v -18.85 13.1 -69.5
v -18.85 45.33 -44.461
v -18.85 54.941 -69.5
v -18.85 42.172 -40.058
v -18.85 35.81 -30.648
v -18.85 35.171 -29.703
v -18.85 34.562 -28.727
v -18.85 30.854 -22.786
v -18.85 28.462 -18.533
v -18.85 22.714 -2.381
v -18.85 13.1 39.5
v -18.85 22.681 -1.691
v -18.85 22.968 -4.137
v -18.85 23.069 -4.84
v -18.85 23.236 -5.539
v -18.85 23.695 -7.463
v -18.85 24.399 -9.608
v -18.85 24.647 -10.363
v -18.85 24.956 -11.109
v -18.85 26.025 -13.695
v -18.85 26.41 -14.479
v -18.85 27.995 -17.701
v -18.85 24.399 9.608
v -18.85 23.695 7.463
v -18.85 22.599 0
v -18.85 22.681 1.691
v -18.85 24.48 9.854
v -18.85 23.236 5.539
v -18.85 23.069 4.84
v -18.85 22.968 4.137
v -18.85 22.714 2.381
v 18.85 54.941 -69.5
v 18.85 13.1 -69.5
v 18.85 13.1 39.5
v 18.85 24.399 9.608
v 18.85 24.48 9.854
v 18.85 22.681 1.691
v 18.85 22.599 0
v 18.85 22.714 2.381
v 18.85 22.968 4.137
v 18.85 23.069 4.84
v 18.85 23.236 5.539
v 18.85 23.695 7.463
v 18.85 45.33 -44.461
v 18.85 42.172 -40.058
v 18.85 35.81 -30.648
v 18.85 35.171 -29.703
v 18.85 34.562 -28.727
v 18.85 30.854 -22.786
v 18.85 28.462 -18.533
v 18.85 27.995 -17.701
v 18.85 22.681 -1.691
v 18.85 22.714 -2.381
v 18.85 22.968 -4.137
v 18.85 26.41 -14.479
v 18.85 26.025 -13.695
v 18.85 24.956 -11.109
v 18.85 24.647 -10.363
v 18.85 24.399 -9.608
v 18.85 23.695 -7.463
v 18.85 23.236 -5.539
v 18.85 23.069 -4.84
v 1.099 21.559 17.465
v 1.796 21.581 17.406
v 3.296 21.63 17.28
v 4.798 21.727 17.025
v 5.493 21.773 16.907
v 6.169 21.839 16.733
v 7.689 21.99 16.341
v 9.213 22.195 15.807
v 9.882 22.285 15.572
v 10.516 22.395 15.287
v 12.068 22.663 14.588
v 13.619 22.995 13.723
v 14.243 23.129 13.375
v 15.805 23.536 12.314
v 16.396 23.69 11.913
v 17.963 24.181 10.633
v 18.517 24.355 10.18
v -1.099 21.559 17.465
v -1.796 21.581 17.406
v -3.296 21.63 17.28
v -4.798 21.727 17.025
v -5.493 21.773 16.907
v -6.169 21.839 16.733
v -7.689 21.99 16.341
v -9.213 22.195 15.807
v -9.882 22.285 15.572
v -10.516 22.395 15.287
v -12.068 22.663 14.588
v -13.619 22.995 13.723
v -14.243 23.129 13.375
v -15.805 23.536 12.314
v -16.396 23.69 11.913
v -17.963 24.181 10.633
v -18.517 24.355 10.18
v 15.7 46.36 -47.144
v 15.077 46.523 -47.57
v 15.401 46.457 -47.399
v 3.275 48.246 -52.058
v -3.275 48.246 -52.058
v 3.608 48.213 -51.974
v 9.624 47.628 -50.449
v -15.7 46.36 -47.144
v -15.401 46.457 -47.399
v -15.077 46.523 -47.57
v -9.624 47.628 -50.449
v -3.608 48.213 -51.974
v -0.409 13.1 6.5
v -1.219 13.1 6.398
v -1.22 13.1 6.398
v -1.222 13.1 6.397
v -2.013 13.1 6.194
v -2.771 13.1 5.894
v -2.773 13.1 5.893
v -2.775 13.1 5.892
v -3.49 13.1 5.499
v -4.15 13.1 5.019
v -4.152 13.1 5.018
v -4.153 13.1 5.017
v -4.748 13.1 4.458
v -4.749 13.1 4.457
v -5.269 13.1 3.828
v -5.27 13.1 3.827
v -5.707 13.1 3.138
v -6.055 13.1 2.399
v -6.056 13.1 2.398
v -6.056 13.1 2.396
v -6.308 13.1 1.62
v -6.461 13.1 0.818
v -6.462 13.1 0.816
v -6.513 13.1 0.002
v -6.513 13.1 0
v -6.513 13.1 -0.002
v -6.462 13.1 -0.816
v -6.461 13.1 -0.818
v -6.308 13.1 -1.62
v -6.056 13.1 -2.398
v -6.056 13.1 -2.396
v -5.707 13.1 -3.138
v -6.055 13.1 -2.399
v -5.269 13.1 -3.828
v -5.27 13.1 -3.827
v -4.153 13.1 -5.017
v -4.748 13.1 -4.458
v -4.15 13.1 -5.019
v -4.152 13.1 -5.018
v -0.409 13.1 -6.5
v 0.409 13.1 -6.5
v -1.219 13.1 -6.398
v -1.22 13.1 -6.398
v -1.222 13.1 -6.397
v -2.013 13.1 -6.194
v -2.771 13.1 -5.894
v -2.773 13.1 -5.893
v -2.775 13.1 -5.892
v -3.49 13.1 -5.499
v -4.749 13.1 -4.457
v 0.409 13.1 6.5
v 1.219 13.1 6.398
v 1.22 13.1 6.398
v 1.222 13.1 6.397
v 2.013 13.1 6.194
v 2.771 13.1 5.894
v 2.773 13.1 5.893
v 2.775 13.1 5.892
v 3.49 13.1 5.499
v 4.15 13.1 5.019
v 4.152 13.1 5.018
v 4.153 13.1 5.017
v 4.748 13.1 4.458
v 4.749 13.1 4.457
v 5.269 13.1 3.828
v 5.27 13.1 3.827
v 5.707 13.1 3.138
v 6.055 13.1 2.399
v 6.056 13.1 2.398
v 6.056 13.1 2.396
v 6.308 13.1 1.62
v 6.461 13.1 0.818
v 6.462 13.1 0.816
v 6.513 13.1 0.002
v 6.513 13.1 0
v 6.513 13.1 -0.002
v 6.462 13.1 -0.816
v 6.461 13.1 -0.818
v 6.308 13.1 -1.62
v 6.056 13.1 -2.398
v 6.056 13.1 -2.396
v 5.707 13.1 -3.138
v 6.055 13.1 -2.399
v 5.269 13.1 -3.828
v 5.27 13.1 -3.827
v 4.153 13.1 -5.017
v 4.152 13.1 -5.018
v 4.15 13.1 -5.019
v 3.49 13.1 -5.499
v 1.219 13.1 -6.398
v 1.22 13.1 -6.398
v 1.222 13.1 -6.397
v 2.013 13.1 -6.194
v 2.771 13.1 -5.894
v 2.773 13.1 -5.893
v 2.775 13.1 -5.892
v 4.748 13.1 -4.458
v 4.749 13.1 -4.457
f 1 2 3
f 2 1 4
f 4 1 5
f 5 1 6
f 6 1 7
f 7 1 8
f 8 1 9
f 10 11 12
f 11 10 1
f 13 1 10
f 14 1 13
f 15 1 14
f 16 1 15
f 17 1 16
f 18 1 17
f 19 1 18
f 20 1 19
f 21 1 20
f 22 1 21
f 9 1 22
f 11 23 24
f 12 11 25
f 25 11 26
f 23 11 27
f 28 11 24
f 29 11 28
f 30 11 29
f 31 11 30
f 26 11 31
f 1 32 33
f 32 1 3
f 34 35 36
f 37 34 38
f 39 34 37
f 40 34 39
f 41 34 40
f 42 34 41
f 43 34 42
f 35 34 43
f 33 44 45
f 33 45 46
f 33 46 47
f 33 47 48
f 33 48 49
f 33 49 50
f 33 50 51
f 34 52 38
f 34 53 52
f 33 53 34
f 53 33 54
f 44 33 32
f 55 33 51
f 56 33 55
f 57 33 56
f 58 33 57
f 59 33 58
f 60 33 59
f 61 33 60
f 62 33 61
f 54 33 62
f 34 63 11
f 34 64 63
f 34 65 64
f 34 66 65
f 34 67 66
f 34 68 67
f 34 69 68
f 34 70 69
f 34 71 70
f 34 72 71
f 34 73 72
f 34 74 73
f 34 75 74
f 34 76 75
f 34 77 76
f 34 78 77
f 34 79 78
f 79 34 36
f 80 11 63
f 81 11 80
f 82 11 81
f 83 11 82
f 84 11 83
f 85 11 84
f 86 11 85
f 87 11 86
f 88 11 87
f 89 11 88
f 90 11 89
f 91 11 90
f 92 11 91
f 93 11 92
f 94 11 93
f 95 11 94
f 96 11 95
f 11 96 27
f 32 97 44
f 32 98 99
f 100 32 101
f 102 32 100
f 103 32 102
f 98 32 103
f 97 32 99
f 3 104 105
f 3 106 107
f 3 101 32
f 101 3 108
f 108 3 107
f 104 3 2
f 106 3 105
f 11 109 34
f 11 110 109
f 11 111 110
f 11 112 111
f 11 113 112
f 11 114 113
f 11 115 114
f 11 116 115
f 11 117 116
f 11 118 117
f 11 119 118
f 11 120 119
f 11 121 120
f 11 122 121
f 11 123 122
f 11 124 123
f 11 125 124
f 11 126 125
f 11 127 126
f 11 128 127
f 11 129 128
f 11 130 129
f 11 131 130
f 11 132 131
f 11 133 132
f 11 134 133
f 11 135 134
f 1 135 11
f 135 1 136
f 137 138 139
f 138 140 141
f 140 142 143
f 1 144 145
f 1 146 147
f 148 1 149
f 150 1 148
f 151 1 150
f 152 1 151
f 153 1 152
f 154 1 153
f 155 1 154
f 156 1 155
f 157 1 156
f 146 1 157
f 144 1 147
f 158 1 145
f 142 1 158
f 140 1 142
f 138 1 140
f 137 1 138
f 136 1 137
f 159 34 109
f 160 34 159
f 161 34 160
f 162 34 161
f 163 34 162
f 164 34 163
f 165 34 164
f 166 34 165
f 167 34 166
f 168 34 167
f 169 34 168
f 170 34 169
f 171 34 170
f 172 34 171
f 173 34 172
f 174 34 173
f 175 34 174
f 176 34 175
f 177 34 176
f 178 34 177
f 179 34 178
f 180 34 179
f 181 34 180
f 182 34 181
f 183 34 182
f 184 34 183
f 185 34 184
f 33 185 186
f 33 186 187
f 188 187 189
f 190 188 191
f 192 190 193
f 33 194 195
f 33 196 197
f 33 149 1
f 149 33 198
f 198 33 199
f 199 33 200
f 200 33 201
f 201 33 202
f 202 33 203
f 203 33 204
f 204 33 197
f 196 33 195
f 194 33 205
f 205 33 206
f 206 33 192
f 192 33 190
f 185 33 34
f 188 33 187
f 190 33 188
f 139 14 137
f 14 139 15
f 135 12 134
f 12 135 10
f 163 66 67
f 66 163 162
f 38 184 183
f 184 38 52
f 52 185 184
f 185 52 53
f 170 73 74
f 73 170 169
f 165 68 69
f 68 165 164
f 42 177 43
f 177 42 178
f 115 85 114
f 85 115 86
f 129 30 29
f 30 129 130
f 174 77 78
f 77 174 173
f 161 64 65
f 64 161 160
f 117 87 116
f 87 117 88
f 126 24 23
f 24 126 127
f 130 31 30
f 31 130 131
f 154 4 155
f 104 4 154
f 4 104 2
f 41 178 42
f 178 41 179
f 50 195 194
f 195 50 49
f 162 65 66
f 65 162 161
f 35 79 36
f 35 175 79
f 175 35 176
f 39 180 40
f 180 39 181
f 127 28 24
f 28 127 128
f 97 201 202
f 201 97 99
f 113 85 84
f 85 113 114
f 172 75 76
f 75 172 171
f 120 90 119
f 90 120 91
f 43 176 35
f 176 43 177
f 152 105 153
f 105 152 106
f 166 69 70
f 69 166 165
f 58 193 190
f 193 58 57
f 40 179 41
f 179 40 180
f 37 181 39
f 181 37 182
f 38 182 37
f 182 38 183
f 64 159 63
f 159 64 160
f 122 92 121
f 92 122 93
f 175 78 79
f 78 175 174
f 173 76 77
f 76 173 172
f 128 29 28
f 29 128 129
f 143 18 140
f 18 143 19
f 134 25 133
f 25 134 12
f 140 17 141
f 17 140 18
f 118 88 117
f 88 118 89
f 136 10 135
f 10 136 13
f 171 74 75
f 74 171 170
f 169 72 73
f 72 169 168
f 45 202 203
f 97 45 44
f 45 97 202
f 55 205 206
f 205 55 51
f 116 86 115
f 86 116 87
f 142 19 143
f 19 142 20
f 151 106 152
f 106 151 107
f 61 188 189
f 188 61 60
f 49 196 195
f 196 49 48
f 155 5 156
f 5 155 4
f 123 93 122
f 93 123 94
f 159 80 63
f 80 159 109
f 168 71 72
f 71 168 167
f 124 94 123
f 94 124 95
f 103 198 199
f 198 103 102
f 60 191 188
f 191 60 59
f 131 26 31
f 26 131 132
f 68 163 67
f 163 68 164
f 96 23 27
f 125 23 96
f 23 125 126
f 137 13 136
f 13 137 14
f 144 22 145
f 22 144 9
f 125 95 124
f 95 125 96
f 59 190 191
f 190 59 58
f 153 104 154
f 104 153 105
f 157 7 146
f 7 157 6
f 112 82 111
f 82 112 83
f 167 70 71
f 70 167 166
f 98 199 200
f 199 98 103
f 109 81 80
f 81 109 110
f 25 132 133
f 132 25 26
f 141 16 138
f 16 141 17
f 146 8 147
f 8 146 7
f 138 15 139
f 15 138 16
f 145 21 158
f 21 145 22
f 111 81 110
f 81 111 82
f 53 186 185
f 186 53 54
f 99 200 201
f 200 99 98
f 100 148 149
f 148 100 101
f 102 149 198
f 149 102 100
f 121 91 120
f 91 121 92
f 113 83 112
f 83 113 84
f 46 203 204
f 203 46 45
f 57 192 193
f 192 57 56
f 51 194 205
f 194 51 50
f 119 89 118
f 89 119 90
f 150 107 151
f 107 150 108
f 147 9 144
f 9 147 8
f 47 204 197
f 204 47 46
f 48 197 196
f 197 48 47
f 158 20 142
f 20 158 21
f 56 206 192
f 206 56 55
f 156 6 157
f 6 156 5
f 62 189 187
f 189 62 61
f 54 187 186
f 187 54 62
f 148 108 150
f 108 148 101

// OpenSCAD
// Pi Zero Cam Holder
// The "Officiële Raspberry Pi Zero Behuizing"
// - os rounded, so thickness varies 

include <MCAD/boxes.scad>

// box below refers to the housing 
// therefore it is NOT the case we build around it
// box thickness starts at 13 and is raised towards the middle
// rubbers add an additional 1.6mm
// also allow for some spacing (0.4)
rubber_th=1.6;
box_th_bare=14.6;
box_th_incl_rubber=box_th_bare+rubber_th;
box_th=box_th_incl_rubber+0.4;
box_h=79;
box_w=37.7;
box_r=2;

// camera sticks out from the cover approx 4mm
cam_lens_l_normal=3.6; // measured from top of the box cover
cam_lens_l_wide=4.5;   // this one is bigger
cam_lens_l=max(cam_lens_l_normal,cam_lens_l_wide);

// cam hole diameter including spacing
cam_lens_d=8.5; // the box comes with this hole  

// the housing is the metal box holding the lens
cam_hous_w=11.0;
cam_hous_w2=cam_hous_w/2;
cam_hous_th=0.7; // as measured from the top of the box cover

// work with theme material thickness
m=0.4*4; m2=m*2;

$fn=50;

debug=0;
cord=0;
  
//create room for the camera lens to fit inside of the box
lens_rm=4.8; half_rm=lens_rm/2;

module angle(d = 21) {
    e=30;
    o=(box_h+e) * tan(d);
    a=[0,box_h/2];
    b=[0,-box_h/2-e];
    c=[o,-box_h/2-e];
    
    polygon([a,b,c]);
}

//!rotate([-21,0,33])
!difference() {
    translate([-box_w/2,box_th/2+lens_rm,0])
        rotate([90,0,90]) linear_extrude(box_w) angle();
    // normal h=66 graden, wide h=102 graden
    // uitgaande van 33 graden en hoogte 30 +40
    h=60;
    o=h*tan(33);
    translate([0,box_th/2+lens_rm-0.01,0]) 
        rotate([-90,0,0]) 
        cylinder(h=h,r1=6.5,r2=6.5+2*o);
}

module cord_holder() {
    cord_d=3.5;
    translate([
            cord_d/2+max(m,box_r),
            -cord_d/2,
            cord_d/2+m])
    difference() {
        translate([-cord_d/2-m,-cord_d/2-m,-cord_d/2-m])
            union() {
                cube([cord_d+m2, cord_d+m2, cord_d+m2]);
                cube([cord_d+m2, cord_d+m+max(m,box_r), m]);
            }
        rotate([0,90,0]) 
            translate([0,0,-cord_d/2-m-0.01])
            union() {
                cylinder(d=cord_d,h=cord_d+m2+0.02);
                hull() {
                    cylinder(d=cord_d-0.4,h=cord_d+m2+0.02);
                    translate([-3.5,0,0])
                        cylinder(d=cord_d-0.4,h=cord_d+m2+0.02);
                }
            }
    }
}
if (cord) {
  translate([-box_w/2,-box_th/2-m,-box_h/2-m]) cord_holder();
  translate([box_w/2-3.5-box_r-box_r,-box_th/2-m,-box_h/2-m]) cord_holder();
}

module draw_cam_module() {
    union() {
        // lens
        color("black",1.0) cylinder(d=8, h=cam_lens_l);
        translate([-cam_hous_w/2,-cam_hous_w/2])
        color("#c0c0c0",1.0) cube([cam_hous_w,cam_hous_w,cam_hous_th]);
    }
}
module draw_pi_housing() {
    hull() {
        translate([
                -box_w/2,
                -box_th_incl_rubber/2,
                -box_h/2])
            cube([box_w/2,13+rubber_th,box_h]);
        translate([
                -box_w/2,
                -box_th/2,
                -cam_hous_w/2])
            cube([box_w/2,box_th_incl_rubber,cam_hous_w]);
    }
}

if (debug) {
    color("red", 0.5) draw_pi_housing();

    // check to see if camera looks ok
    translate([
            0,
            -box_th/2 +           // from backside
            box_th_incl_rubber,   // on rubbers
            0]) 
        rotate([-90,0,0])
        draw_cam_module();
}

// the basic box
difference() {
    translate([0,half_rm,0])
        roundedBox(
                size=[box_w+m2, box_th+m2+lens_rm, box_h+m2],
                radius=box_r,
                sidesonly=false);
    
    // make it a box instead of a block 
    translate([0,half_rm,0])
        cube(
            [box_w, box_th+lens_rm, box_h],
            center=true);
    
    // remove top of the box
    translate([
            -box_w/2-m,
            -box_th/2-m,
            (box_h+m2)/2-max(box_r,m)-0.01])
        cube([
                box_w+m2+0.1,
                box_th+lens_rm+m2+0.01, 
                max(box_r,m)+0.02]);

    // peek into the box 
    if (debug) {
        translate([-4,-4,0])
            cube(
                [box_w, box_th-4, box_h+m2+0.01],
                center=true);
        translate([box_w/2,+10,0])
            cube(
                [box_w, box_th-4, box_h+m2+0.01],
                center=true);
    }
    
    // help push the camera out of the box (hole in the bottom)
    roundedBox([16,11,box_h+m2+0.01+box_r*2],radius=box_r,sidesonly=false);            
        
    // the camera needs to look outside of the box
    hull() {
        translate([0,box_th/2+lens_rm-0.01,0]) 
            rotate([-90,0,0])
            cylinder(d=cam_lens_d, h=0.01);
        translate([0,box_th/2+lens_rm+m+0.01,0]) 
            rotate([-90,0,0])
            cylinder(d=cam_lens_d+3, h=20.01);
    }
    hull() {
      translate([0,box_th/2,0])
        cube([cam_lens_d,cam_lens_l+0.4,cam_lens_d],center=true);
      translate([0,box_th/2,box_h/2])
        cube([cam_lens_d,cam_lens_l+0.4,cam_lens_d],center=true);
    }
    
    // create hole for power connector
    // when box is upright pwr is on the right side
    pwr_c_wi=10.8;
    pwr_c_th=6.7;
    pwr_c_le=20;
    pwr_c_sp=0.8; pwr_c_sp2=pwr_c_sp*2;
    
    translate([
        box_w/2-0.1,
        -box_th/2+rubber_th+3.8-2-pwr_c_sp,
        -box_h/2+12.8-pwr_c_sp])
      cube([m+0.2,pwr_c_th+pwr_c_sp2,pwr_c_wi+pwr_c_sp2]);
}

// push back bars for the back side of the pi box
translate([
        -7,
        -box_th/2,
        -box_h/2])
    cube([
            m,
            rubber_th,
            box_h]);
translate([
        7-m,
        -box_th/2,
        -box_h/2])
    cube([
            m,
            rubber_th,
            box_h]);

// push back bars for the front side of the pi box
translate([
        -cam_hous_w/2-m-0.6,
        box_th/2,
        -box_h/2])
    cube([
            m,
            lens_rm+0.1,
            box_h]);
translate([
        cam_hous_w/2+0.6,
        box_th/2,
        -box_h/2])
    cube([
            m,
            lens_rm+0.1,
            box_h]);

// push back bars for the front side edge of the pi box
translate([
        -cam_hous_w/2-m-0.6,
        box_th/2-2,
        -box_h/2])
    hull() {
        cube([
            m,
            2+lens_rm,
            1]);
        translate([0,2,24])
            cube([
                m,
                lens_rm,
                2]);
    }
translate([
        cam_hous_w/2+0.6,
        box_th/2-2,
        -box_h/2])
    hull() {
        cube([
            m,
            2+lens_rm,
            1]);
        translate([0,2,24])
            cube([
                m,
                lens_rm,
                2]);
    }

// sample power plug    
if (debug) {
    translate([
            box_w/2,
            -box_th/2-m+3.6+1.6,
            -box_h/2-m+14.4])
        color("white") { 
            cube([21+m,6.5,11]);
            translate([0,3.25,5.5])
                rotate([0,90,0])
                cylinder(d=6,h=30+m);
    }
}
    
// beugeltje
translate([box_w/2,box_th/2+lens_rm,-box_h/2-m]) {
    translate([m-box_r-0.1,0,0])
        cube([50+box_r+0.1,m,14+11+10]);
    translate([0,m-box_r-0.1,0])
        cube([m,box_r+0.1,14+11+10]);
    translate([0,-box_th]) {
        hull() {
            cube([10+m,box_th,m]);
            translate([40+box_r,box_th-2,0])
                cube([m,m+2,m]);
        }
        cube([m,box_th,max(m,box_r)+0.1]);
        translate([m-box_r-0.1,0,0])
            cube([box_r+0.1,box_th,m]);
            
    }
}
    
